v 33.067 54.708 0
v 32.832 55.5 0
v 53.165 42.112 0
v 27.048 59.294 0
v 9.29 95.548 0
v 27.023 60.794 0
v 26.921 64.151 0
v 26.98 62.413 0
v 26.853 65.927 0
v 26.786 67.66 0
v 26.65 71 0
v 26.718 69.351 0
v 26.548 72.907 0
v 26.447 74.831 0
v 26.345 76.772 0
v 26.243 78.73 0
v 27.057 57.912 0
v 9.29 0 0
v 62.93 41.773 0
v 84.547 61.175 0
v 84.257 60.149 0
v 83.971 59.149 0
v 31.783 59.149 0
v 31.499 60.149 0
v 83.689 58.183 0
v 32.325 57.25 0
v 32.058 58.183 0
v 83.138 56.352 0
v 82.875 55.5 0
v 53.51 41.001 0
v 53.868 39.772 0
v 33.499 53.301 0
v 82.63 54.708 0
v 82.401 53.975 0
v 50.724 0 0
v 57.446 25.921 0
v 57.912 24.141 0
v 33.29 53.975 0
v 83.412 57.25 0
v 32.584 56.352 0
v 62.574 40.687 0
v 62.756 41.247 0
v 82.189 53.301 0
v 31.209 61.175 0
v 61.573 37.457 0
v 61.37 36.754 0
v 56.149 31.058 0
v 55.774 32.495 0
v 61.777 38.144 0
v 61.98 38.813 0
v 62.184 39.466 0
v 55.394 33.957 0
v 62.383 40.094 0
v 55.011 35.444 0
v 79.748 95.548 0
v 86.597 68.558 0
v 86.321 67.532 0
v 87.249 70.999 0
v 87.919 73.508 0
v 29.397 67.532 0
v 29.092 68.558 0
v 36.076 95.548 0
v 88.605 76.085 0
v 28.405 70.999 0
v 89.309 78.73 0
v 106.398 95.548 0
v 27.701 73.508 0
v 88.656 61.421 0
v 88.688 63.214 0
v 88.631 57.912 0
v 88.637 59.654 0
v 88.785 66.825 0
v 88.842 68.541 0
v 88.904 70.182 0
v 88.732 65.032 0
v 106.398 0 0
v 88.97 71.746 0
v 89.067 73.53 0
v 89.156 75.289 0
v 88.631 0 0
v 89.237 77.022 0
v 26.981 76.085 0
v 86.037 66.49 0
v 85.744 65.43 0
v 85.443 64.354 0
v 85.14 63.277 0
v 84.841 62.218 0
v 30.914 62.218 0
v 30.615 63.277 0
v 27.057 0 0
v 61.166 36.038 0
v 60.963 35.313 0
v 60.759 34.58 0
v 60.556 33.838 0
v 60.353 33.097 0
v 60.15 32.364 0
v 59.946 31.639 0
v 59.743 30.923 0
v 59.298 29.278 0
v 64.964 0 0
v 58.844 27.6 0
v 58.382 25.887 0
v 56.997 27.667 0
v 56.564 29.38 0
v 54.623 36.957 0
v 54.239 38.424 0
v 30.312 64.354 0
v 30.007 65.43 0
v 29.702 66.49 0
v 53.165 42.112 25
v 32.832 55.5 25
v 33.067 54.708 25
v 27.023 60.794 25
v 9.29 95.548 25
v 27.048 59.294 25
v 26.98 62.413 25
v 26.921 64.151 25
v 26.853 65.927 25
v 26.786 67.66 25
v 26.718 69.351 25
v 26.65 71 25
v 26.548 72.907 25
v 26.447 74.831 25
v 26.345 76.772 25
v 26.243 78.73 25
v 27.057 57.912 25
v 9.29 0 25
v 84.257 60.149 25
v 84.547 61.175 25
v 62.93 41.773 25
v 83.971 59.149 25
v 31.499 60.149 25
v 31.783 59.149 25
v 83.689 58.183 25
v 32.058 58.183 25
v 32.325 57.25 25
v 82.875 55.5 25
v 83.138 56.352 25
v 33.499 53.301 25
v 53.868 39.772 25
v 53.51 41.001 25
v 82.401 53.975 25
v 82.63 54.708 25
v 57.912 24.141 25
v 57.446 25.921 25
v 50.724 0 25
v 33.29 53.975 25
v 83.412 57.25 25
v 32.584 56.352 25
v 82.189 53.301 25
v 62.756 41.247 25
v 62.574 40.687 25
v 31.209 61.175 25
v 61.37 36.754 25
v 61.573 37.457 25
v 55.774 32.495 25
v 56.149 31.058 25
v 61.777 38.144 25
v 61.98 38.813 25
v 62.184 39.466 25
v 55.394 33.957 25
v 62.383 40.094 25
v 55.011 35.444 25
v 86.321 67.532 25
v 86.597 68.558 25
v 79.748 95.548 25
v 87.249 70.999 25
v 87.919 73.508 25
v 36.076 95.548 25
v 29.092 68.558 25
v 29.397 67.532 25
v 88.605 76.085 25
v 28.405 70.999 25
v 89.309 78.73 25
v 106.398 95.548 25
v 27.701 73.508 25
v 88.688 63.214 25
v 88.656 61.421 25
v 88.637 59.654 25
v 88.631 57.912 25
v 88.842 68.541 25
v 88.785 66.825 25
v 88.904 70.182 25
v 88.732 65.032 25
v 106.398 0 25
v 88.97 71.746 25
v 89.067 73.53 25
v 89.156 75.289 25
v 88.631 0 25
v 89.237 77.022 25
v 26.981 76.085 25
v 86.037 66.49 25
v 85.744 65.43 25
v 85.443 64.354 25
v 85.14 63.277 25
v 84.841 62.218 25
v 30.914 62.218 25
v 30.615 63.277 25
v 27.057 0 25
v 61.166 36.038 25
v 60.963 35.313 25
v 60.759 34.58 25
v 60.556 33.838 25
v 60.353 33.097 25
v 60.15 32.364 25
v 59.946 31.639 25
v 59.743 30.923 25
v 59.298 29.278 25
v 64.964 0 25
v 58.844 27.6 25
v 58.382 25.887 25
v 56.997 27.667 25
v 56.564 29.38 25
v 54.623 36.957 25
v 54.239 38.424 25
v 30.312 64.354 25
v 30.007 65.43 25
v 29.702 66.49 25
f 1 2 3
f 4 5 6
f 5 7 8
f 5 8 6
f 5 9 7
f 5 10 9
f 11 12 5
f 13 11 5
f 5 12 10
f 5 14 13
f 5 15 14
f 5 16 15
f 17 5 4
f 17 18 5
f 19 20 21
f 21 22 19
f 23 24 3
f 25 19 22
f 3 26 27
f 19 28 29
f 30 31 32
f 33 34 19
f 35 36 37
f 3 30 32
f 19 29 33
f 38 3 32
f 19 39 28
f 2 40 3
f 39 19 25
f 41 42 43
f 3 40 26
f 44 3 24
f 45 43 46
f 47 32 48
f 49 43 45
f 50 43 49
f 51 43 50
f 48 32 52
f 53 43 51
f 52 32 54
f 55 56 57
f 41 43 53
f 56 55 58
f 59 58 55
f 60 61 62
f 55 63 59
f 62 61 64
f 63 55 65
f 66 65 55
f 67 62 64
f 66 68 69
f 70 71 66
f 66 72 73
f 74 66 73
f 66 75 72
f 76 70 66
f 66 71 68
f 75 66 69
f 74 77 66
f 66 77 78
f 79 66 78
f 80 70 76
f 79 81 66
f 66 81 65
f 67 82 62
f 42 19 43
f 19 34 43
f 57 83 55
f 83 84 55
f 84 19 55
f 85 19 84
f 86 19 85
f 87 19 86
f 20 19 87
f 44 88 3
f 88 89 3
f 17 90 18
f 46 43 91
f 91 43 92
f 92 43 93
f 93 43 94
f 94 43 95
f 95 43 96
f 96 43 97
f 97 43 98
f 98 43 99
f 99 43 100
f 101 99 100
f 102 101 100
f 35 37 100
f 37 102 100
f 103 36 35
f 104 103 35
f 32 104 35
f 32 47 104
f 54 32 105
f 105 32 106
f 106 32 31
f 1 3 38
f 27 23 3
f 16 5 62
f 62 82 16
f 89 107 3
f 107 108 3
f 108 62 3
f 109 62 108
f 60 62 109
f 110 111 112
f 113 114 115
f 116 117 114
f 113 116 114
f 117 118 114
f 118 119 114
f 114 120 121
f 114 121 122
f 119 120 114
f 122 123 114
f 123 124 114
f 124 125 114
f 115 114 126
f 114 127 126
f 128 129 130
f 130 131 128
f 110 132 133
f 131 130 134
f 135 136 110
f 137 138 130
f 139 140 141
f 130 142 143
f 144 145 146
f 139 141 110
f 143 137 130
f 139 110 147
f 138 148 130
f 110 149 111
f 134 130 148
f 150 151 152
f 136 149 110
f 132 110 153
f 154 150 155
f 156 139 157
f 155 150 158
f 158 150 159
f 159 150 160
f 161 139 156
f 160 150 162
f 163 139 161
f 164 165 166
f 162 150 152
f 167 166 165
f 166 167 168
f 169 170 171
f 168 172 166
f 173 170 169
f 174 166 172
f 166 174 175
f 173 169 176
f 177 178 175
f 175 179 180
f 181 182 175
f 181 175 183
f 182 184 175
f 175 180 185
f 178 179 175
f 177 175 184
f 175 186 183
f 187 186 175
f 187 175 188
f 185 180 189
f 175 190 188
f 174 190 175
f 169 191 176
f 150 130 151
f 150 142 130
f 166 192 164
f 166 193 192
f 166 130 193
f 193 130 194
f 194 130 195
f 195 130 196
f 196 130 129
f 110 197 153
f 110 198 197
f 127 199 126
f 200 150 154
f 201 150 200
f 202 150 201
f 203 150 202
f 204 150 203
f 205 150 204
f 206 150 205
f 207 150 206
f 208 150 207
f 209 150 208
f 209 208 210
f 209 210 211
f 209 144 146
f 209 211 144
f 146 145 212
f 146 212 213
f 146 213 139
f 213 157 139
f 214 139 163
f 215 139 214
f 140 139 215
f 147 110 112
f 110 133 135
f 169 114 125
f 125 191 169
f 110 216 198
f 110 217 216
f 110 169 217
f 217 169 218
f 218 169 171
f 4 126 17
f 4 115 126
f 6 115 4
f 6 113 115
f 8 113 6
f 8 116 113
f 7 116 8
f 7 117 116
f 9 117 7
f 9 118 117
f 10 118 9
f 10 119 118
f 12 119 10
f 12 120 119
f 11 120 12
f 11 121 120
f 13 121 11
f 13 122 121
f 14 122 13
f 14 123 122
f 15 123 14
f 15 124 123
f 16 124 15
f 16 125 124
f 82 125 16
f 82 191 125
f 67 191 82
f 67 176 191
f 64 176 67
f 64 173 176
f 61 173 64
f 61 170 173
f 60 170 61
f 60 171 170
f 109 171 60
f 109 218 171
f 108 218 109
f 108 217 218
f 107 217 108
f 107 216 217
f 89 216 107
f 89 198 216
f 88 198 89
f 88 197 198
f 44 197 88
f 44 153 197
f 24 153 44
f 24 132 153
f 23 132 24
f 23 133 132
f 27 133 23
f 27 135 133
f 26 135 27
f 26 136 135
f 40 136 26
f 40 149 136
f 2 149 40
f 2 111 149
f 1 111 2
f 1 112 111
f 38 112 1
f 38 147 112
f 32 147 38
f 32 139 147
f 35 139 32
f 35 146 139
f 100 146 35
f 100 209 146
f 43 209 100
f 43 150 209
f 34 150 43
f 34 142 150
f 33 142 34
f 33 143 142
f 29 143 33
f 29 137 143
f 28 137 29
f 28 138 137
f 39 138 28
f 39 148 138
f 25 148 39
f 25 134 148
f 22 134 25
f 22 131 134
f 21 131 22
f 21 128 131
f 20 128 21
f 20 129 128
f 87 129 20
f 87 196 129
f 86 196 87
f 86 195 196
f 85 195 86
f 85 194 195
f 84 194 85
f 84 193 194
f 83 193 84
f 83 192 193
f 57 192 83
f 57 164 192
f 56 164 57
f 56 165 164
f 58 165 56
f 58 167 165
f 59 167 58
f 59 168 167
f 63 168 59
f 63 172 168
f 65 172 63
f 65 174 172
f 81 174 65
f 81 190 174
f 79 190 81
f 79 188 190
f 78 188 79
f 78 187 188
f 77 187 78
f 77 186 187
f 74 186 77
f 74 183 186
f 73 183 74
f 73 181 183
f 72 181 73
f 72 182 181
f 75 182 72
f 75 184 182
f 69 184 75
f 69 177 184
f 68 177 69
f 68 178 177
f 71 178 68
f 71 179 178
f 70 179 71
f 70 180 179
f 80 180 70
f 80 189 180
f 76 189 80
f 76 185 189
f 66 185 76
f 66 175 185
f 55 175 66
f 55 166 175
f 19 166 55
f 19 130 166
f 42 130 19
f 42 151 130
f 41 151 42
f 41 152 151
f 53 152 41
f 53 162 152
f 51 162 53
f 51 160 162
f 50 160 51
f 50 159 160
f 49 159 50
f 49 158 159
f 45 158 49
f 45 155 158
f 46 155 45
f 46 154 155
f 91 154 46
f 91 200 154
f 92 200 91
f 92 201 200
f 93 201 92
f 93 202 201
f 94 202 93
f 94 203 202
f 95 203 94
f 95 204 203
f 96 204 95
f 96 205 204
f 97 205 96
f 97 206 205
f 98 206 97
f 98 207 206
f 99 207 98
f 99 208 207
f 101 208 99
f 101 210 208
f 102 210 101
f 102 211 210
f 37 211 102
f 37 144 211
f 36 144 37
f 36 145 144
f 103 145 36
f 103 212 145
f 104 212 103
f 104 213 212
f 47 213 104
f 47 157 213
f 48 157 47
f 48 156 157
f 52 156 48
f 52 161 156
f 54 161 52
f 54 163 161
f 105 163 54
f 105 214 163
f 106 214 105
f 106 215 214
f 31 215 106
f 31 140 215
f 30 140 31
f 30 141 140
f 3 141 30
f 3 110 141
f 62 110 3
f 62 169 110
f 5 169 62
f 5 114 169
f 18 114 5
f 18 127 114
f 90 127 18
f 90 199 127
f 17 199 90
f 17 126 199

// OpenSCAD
h = 100;
w = 96;
d = 25;
b = 10;
x = 10;
base = 0;

translate([-b+x,-b,0]) color("red")
  cube([w+2*b,h+2*b,base]);
letter();

module letter() {
  linear_extrude(d)
    text("M", h, "Arial:style=bold");
}
